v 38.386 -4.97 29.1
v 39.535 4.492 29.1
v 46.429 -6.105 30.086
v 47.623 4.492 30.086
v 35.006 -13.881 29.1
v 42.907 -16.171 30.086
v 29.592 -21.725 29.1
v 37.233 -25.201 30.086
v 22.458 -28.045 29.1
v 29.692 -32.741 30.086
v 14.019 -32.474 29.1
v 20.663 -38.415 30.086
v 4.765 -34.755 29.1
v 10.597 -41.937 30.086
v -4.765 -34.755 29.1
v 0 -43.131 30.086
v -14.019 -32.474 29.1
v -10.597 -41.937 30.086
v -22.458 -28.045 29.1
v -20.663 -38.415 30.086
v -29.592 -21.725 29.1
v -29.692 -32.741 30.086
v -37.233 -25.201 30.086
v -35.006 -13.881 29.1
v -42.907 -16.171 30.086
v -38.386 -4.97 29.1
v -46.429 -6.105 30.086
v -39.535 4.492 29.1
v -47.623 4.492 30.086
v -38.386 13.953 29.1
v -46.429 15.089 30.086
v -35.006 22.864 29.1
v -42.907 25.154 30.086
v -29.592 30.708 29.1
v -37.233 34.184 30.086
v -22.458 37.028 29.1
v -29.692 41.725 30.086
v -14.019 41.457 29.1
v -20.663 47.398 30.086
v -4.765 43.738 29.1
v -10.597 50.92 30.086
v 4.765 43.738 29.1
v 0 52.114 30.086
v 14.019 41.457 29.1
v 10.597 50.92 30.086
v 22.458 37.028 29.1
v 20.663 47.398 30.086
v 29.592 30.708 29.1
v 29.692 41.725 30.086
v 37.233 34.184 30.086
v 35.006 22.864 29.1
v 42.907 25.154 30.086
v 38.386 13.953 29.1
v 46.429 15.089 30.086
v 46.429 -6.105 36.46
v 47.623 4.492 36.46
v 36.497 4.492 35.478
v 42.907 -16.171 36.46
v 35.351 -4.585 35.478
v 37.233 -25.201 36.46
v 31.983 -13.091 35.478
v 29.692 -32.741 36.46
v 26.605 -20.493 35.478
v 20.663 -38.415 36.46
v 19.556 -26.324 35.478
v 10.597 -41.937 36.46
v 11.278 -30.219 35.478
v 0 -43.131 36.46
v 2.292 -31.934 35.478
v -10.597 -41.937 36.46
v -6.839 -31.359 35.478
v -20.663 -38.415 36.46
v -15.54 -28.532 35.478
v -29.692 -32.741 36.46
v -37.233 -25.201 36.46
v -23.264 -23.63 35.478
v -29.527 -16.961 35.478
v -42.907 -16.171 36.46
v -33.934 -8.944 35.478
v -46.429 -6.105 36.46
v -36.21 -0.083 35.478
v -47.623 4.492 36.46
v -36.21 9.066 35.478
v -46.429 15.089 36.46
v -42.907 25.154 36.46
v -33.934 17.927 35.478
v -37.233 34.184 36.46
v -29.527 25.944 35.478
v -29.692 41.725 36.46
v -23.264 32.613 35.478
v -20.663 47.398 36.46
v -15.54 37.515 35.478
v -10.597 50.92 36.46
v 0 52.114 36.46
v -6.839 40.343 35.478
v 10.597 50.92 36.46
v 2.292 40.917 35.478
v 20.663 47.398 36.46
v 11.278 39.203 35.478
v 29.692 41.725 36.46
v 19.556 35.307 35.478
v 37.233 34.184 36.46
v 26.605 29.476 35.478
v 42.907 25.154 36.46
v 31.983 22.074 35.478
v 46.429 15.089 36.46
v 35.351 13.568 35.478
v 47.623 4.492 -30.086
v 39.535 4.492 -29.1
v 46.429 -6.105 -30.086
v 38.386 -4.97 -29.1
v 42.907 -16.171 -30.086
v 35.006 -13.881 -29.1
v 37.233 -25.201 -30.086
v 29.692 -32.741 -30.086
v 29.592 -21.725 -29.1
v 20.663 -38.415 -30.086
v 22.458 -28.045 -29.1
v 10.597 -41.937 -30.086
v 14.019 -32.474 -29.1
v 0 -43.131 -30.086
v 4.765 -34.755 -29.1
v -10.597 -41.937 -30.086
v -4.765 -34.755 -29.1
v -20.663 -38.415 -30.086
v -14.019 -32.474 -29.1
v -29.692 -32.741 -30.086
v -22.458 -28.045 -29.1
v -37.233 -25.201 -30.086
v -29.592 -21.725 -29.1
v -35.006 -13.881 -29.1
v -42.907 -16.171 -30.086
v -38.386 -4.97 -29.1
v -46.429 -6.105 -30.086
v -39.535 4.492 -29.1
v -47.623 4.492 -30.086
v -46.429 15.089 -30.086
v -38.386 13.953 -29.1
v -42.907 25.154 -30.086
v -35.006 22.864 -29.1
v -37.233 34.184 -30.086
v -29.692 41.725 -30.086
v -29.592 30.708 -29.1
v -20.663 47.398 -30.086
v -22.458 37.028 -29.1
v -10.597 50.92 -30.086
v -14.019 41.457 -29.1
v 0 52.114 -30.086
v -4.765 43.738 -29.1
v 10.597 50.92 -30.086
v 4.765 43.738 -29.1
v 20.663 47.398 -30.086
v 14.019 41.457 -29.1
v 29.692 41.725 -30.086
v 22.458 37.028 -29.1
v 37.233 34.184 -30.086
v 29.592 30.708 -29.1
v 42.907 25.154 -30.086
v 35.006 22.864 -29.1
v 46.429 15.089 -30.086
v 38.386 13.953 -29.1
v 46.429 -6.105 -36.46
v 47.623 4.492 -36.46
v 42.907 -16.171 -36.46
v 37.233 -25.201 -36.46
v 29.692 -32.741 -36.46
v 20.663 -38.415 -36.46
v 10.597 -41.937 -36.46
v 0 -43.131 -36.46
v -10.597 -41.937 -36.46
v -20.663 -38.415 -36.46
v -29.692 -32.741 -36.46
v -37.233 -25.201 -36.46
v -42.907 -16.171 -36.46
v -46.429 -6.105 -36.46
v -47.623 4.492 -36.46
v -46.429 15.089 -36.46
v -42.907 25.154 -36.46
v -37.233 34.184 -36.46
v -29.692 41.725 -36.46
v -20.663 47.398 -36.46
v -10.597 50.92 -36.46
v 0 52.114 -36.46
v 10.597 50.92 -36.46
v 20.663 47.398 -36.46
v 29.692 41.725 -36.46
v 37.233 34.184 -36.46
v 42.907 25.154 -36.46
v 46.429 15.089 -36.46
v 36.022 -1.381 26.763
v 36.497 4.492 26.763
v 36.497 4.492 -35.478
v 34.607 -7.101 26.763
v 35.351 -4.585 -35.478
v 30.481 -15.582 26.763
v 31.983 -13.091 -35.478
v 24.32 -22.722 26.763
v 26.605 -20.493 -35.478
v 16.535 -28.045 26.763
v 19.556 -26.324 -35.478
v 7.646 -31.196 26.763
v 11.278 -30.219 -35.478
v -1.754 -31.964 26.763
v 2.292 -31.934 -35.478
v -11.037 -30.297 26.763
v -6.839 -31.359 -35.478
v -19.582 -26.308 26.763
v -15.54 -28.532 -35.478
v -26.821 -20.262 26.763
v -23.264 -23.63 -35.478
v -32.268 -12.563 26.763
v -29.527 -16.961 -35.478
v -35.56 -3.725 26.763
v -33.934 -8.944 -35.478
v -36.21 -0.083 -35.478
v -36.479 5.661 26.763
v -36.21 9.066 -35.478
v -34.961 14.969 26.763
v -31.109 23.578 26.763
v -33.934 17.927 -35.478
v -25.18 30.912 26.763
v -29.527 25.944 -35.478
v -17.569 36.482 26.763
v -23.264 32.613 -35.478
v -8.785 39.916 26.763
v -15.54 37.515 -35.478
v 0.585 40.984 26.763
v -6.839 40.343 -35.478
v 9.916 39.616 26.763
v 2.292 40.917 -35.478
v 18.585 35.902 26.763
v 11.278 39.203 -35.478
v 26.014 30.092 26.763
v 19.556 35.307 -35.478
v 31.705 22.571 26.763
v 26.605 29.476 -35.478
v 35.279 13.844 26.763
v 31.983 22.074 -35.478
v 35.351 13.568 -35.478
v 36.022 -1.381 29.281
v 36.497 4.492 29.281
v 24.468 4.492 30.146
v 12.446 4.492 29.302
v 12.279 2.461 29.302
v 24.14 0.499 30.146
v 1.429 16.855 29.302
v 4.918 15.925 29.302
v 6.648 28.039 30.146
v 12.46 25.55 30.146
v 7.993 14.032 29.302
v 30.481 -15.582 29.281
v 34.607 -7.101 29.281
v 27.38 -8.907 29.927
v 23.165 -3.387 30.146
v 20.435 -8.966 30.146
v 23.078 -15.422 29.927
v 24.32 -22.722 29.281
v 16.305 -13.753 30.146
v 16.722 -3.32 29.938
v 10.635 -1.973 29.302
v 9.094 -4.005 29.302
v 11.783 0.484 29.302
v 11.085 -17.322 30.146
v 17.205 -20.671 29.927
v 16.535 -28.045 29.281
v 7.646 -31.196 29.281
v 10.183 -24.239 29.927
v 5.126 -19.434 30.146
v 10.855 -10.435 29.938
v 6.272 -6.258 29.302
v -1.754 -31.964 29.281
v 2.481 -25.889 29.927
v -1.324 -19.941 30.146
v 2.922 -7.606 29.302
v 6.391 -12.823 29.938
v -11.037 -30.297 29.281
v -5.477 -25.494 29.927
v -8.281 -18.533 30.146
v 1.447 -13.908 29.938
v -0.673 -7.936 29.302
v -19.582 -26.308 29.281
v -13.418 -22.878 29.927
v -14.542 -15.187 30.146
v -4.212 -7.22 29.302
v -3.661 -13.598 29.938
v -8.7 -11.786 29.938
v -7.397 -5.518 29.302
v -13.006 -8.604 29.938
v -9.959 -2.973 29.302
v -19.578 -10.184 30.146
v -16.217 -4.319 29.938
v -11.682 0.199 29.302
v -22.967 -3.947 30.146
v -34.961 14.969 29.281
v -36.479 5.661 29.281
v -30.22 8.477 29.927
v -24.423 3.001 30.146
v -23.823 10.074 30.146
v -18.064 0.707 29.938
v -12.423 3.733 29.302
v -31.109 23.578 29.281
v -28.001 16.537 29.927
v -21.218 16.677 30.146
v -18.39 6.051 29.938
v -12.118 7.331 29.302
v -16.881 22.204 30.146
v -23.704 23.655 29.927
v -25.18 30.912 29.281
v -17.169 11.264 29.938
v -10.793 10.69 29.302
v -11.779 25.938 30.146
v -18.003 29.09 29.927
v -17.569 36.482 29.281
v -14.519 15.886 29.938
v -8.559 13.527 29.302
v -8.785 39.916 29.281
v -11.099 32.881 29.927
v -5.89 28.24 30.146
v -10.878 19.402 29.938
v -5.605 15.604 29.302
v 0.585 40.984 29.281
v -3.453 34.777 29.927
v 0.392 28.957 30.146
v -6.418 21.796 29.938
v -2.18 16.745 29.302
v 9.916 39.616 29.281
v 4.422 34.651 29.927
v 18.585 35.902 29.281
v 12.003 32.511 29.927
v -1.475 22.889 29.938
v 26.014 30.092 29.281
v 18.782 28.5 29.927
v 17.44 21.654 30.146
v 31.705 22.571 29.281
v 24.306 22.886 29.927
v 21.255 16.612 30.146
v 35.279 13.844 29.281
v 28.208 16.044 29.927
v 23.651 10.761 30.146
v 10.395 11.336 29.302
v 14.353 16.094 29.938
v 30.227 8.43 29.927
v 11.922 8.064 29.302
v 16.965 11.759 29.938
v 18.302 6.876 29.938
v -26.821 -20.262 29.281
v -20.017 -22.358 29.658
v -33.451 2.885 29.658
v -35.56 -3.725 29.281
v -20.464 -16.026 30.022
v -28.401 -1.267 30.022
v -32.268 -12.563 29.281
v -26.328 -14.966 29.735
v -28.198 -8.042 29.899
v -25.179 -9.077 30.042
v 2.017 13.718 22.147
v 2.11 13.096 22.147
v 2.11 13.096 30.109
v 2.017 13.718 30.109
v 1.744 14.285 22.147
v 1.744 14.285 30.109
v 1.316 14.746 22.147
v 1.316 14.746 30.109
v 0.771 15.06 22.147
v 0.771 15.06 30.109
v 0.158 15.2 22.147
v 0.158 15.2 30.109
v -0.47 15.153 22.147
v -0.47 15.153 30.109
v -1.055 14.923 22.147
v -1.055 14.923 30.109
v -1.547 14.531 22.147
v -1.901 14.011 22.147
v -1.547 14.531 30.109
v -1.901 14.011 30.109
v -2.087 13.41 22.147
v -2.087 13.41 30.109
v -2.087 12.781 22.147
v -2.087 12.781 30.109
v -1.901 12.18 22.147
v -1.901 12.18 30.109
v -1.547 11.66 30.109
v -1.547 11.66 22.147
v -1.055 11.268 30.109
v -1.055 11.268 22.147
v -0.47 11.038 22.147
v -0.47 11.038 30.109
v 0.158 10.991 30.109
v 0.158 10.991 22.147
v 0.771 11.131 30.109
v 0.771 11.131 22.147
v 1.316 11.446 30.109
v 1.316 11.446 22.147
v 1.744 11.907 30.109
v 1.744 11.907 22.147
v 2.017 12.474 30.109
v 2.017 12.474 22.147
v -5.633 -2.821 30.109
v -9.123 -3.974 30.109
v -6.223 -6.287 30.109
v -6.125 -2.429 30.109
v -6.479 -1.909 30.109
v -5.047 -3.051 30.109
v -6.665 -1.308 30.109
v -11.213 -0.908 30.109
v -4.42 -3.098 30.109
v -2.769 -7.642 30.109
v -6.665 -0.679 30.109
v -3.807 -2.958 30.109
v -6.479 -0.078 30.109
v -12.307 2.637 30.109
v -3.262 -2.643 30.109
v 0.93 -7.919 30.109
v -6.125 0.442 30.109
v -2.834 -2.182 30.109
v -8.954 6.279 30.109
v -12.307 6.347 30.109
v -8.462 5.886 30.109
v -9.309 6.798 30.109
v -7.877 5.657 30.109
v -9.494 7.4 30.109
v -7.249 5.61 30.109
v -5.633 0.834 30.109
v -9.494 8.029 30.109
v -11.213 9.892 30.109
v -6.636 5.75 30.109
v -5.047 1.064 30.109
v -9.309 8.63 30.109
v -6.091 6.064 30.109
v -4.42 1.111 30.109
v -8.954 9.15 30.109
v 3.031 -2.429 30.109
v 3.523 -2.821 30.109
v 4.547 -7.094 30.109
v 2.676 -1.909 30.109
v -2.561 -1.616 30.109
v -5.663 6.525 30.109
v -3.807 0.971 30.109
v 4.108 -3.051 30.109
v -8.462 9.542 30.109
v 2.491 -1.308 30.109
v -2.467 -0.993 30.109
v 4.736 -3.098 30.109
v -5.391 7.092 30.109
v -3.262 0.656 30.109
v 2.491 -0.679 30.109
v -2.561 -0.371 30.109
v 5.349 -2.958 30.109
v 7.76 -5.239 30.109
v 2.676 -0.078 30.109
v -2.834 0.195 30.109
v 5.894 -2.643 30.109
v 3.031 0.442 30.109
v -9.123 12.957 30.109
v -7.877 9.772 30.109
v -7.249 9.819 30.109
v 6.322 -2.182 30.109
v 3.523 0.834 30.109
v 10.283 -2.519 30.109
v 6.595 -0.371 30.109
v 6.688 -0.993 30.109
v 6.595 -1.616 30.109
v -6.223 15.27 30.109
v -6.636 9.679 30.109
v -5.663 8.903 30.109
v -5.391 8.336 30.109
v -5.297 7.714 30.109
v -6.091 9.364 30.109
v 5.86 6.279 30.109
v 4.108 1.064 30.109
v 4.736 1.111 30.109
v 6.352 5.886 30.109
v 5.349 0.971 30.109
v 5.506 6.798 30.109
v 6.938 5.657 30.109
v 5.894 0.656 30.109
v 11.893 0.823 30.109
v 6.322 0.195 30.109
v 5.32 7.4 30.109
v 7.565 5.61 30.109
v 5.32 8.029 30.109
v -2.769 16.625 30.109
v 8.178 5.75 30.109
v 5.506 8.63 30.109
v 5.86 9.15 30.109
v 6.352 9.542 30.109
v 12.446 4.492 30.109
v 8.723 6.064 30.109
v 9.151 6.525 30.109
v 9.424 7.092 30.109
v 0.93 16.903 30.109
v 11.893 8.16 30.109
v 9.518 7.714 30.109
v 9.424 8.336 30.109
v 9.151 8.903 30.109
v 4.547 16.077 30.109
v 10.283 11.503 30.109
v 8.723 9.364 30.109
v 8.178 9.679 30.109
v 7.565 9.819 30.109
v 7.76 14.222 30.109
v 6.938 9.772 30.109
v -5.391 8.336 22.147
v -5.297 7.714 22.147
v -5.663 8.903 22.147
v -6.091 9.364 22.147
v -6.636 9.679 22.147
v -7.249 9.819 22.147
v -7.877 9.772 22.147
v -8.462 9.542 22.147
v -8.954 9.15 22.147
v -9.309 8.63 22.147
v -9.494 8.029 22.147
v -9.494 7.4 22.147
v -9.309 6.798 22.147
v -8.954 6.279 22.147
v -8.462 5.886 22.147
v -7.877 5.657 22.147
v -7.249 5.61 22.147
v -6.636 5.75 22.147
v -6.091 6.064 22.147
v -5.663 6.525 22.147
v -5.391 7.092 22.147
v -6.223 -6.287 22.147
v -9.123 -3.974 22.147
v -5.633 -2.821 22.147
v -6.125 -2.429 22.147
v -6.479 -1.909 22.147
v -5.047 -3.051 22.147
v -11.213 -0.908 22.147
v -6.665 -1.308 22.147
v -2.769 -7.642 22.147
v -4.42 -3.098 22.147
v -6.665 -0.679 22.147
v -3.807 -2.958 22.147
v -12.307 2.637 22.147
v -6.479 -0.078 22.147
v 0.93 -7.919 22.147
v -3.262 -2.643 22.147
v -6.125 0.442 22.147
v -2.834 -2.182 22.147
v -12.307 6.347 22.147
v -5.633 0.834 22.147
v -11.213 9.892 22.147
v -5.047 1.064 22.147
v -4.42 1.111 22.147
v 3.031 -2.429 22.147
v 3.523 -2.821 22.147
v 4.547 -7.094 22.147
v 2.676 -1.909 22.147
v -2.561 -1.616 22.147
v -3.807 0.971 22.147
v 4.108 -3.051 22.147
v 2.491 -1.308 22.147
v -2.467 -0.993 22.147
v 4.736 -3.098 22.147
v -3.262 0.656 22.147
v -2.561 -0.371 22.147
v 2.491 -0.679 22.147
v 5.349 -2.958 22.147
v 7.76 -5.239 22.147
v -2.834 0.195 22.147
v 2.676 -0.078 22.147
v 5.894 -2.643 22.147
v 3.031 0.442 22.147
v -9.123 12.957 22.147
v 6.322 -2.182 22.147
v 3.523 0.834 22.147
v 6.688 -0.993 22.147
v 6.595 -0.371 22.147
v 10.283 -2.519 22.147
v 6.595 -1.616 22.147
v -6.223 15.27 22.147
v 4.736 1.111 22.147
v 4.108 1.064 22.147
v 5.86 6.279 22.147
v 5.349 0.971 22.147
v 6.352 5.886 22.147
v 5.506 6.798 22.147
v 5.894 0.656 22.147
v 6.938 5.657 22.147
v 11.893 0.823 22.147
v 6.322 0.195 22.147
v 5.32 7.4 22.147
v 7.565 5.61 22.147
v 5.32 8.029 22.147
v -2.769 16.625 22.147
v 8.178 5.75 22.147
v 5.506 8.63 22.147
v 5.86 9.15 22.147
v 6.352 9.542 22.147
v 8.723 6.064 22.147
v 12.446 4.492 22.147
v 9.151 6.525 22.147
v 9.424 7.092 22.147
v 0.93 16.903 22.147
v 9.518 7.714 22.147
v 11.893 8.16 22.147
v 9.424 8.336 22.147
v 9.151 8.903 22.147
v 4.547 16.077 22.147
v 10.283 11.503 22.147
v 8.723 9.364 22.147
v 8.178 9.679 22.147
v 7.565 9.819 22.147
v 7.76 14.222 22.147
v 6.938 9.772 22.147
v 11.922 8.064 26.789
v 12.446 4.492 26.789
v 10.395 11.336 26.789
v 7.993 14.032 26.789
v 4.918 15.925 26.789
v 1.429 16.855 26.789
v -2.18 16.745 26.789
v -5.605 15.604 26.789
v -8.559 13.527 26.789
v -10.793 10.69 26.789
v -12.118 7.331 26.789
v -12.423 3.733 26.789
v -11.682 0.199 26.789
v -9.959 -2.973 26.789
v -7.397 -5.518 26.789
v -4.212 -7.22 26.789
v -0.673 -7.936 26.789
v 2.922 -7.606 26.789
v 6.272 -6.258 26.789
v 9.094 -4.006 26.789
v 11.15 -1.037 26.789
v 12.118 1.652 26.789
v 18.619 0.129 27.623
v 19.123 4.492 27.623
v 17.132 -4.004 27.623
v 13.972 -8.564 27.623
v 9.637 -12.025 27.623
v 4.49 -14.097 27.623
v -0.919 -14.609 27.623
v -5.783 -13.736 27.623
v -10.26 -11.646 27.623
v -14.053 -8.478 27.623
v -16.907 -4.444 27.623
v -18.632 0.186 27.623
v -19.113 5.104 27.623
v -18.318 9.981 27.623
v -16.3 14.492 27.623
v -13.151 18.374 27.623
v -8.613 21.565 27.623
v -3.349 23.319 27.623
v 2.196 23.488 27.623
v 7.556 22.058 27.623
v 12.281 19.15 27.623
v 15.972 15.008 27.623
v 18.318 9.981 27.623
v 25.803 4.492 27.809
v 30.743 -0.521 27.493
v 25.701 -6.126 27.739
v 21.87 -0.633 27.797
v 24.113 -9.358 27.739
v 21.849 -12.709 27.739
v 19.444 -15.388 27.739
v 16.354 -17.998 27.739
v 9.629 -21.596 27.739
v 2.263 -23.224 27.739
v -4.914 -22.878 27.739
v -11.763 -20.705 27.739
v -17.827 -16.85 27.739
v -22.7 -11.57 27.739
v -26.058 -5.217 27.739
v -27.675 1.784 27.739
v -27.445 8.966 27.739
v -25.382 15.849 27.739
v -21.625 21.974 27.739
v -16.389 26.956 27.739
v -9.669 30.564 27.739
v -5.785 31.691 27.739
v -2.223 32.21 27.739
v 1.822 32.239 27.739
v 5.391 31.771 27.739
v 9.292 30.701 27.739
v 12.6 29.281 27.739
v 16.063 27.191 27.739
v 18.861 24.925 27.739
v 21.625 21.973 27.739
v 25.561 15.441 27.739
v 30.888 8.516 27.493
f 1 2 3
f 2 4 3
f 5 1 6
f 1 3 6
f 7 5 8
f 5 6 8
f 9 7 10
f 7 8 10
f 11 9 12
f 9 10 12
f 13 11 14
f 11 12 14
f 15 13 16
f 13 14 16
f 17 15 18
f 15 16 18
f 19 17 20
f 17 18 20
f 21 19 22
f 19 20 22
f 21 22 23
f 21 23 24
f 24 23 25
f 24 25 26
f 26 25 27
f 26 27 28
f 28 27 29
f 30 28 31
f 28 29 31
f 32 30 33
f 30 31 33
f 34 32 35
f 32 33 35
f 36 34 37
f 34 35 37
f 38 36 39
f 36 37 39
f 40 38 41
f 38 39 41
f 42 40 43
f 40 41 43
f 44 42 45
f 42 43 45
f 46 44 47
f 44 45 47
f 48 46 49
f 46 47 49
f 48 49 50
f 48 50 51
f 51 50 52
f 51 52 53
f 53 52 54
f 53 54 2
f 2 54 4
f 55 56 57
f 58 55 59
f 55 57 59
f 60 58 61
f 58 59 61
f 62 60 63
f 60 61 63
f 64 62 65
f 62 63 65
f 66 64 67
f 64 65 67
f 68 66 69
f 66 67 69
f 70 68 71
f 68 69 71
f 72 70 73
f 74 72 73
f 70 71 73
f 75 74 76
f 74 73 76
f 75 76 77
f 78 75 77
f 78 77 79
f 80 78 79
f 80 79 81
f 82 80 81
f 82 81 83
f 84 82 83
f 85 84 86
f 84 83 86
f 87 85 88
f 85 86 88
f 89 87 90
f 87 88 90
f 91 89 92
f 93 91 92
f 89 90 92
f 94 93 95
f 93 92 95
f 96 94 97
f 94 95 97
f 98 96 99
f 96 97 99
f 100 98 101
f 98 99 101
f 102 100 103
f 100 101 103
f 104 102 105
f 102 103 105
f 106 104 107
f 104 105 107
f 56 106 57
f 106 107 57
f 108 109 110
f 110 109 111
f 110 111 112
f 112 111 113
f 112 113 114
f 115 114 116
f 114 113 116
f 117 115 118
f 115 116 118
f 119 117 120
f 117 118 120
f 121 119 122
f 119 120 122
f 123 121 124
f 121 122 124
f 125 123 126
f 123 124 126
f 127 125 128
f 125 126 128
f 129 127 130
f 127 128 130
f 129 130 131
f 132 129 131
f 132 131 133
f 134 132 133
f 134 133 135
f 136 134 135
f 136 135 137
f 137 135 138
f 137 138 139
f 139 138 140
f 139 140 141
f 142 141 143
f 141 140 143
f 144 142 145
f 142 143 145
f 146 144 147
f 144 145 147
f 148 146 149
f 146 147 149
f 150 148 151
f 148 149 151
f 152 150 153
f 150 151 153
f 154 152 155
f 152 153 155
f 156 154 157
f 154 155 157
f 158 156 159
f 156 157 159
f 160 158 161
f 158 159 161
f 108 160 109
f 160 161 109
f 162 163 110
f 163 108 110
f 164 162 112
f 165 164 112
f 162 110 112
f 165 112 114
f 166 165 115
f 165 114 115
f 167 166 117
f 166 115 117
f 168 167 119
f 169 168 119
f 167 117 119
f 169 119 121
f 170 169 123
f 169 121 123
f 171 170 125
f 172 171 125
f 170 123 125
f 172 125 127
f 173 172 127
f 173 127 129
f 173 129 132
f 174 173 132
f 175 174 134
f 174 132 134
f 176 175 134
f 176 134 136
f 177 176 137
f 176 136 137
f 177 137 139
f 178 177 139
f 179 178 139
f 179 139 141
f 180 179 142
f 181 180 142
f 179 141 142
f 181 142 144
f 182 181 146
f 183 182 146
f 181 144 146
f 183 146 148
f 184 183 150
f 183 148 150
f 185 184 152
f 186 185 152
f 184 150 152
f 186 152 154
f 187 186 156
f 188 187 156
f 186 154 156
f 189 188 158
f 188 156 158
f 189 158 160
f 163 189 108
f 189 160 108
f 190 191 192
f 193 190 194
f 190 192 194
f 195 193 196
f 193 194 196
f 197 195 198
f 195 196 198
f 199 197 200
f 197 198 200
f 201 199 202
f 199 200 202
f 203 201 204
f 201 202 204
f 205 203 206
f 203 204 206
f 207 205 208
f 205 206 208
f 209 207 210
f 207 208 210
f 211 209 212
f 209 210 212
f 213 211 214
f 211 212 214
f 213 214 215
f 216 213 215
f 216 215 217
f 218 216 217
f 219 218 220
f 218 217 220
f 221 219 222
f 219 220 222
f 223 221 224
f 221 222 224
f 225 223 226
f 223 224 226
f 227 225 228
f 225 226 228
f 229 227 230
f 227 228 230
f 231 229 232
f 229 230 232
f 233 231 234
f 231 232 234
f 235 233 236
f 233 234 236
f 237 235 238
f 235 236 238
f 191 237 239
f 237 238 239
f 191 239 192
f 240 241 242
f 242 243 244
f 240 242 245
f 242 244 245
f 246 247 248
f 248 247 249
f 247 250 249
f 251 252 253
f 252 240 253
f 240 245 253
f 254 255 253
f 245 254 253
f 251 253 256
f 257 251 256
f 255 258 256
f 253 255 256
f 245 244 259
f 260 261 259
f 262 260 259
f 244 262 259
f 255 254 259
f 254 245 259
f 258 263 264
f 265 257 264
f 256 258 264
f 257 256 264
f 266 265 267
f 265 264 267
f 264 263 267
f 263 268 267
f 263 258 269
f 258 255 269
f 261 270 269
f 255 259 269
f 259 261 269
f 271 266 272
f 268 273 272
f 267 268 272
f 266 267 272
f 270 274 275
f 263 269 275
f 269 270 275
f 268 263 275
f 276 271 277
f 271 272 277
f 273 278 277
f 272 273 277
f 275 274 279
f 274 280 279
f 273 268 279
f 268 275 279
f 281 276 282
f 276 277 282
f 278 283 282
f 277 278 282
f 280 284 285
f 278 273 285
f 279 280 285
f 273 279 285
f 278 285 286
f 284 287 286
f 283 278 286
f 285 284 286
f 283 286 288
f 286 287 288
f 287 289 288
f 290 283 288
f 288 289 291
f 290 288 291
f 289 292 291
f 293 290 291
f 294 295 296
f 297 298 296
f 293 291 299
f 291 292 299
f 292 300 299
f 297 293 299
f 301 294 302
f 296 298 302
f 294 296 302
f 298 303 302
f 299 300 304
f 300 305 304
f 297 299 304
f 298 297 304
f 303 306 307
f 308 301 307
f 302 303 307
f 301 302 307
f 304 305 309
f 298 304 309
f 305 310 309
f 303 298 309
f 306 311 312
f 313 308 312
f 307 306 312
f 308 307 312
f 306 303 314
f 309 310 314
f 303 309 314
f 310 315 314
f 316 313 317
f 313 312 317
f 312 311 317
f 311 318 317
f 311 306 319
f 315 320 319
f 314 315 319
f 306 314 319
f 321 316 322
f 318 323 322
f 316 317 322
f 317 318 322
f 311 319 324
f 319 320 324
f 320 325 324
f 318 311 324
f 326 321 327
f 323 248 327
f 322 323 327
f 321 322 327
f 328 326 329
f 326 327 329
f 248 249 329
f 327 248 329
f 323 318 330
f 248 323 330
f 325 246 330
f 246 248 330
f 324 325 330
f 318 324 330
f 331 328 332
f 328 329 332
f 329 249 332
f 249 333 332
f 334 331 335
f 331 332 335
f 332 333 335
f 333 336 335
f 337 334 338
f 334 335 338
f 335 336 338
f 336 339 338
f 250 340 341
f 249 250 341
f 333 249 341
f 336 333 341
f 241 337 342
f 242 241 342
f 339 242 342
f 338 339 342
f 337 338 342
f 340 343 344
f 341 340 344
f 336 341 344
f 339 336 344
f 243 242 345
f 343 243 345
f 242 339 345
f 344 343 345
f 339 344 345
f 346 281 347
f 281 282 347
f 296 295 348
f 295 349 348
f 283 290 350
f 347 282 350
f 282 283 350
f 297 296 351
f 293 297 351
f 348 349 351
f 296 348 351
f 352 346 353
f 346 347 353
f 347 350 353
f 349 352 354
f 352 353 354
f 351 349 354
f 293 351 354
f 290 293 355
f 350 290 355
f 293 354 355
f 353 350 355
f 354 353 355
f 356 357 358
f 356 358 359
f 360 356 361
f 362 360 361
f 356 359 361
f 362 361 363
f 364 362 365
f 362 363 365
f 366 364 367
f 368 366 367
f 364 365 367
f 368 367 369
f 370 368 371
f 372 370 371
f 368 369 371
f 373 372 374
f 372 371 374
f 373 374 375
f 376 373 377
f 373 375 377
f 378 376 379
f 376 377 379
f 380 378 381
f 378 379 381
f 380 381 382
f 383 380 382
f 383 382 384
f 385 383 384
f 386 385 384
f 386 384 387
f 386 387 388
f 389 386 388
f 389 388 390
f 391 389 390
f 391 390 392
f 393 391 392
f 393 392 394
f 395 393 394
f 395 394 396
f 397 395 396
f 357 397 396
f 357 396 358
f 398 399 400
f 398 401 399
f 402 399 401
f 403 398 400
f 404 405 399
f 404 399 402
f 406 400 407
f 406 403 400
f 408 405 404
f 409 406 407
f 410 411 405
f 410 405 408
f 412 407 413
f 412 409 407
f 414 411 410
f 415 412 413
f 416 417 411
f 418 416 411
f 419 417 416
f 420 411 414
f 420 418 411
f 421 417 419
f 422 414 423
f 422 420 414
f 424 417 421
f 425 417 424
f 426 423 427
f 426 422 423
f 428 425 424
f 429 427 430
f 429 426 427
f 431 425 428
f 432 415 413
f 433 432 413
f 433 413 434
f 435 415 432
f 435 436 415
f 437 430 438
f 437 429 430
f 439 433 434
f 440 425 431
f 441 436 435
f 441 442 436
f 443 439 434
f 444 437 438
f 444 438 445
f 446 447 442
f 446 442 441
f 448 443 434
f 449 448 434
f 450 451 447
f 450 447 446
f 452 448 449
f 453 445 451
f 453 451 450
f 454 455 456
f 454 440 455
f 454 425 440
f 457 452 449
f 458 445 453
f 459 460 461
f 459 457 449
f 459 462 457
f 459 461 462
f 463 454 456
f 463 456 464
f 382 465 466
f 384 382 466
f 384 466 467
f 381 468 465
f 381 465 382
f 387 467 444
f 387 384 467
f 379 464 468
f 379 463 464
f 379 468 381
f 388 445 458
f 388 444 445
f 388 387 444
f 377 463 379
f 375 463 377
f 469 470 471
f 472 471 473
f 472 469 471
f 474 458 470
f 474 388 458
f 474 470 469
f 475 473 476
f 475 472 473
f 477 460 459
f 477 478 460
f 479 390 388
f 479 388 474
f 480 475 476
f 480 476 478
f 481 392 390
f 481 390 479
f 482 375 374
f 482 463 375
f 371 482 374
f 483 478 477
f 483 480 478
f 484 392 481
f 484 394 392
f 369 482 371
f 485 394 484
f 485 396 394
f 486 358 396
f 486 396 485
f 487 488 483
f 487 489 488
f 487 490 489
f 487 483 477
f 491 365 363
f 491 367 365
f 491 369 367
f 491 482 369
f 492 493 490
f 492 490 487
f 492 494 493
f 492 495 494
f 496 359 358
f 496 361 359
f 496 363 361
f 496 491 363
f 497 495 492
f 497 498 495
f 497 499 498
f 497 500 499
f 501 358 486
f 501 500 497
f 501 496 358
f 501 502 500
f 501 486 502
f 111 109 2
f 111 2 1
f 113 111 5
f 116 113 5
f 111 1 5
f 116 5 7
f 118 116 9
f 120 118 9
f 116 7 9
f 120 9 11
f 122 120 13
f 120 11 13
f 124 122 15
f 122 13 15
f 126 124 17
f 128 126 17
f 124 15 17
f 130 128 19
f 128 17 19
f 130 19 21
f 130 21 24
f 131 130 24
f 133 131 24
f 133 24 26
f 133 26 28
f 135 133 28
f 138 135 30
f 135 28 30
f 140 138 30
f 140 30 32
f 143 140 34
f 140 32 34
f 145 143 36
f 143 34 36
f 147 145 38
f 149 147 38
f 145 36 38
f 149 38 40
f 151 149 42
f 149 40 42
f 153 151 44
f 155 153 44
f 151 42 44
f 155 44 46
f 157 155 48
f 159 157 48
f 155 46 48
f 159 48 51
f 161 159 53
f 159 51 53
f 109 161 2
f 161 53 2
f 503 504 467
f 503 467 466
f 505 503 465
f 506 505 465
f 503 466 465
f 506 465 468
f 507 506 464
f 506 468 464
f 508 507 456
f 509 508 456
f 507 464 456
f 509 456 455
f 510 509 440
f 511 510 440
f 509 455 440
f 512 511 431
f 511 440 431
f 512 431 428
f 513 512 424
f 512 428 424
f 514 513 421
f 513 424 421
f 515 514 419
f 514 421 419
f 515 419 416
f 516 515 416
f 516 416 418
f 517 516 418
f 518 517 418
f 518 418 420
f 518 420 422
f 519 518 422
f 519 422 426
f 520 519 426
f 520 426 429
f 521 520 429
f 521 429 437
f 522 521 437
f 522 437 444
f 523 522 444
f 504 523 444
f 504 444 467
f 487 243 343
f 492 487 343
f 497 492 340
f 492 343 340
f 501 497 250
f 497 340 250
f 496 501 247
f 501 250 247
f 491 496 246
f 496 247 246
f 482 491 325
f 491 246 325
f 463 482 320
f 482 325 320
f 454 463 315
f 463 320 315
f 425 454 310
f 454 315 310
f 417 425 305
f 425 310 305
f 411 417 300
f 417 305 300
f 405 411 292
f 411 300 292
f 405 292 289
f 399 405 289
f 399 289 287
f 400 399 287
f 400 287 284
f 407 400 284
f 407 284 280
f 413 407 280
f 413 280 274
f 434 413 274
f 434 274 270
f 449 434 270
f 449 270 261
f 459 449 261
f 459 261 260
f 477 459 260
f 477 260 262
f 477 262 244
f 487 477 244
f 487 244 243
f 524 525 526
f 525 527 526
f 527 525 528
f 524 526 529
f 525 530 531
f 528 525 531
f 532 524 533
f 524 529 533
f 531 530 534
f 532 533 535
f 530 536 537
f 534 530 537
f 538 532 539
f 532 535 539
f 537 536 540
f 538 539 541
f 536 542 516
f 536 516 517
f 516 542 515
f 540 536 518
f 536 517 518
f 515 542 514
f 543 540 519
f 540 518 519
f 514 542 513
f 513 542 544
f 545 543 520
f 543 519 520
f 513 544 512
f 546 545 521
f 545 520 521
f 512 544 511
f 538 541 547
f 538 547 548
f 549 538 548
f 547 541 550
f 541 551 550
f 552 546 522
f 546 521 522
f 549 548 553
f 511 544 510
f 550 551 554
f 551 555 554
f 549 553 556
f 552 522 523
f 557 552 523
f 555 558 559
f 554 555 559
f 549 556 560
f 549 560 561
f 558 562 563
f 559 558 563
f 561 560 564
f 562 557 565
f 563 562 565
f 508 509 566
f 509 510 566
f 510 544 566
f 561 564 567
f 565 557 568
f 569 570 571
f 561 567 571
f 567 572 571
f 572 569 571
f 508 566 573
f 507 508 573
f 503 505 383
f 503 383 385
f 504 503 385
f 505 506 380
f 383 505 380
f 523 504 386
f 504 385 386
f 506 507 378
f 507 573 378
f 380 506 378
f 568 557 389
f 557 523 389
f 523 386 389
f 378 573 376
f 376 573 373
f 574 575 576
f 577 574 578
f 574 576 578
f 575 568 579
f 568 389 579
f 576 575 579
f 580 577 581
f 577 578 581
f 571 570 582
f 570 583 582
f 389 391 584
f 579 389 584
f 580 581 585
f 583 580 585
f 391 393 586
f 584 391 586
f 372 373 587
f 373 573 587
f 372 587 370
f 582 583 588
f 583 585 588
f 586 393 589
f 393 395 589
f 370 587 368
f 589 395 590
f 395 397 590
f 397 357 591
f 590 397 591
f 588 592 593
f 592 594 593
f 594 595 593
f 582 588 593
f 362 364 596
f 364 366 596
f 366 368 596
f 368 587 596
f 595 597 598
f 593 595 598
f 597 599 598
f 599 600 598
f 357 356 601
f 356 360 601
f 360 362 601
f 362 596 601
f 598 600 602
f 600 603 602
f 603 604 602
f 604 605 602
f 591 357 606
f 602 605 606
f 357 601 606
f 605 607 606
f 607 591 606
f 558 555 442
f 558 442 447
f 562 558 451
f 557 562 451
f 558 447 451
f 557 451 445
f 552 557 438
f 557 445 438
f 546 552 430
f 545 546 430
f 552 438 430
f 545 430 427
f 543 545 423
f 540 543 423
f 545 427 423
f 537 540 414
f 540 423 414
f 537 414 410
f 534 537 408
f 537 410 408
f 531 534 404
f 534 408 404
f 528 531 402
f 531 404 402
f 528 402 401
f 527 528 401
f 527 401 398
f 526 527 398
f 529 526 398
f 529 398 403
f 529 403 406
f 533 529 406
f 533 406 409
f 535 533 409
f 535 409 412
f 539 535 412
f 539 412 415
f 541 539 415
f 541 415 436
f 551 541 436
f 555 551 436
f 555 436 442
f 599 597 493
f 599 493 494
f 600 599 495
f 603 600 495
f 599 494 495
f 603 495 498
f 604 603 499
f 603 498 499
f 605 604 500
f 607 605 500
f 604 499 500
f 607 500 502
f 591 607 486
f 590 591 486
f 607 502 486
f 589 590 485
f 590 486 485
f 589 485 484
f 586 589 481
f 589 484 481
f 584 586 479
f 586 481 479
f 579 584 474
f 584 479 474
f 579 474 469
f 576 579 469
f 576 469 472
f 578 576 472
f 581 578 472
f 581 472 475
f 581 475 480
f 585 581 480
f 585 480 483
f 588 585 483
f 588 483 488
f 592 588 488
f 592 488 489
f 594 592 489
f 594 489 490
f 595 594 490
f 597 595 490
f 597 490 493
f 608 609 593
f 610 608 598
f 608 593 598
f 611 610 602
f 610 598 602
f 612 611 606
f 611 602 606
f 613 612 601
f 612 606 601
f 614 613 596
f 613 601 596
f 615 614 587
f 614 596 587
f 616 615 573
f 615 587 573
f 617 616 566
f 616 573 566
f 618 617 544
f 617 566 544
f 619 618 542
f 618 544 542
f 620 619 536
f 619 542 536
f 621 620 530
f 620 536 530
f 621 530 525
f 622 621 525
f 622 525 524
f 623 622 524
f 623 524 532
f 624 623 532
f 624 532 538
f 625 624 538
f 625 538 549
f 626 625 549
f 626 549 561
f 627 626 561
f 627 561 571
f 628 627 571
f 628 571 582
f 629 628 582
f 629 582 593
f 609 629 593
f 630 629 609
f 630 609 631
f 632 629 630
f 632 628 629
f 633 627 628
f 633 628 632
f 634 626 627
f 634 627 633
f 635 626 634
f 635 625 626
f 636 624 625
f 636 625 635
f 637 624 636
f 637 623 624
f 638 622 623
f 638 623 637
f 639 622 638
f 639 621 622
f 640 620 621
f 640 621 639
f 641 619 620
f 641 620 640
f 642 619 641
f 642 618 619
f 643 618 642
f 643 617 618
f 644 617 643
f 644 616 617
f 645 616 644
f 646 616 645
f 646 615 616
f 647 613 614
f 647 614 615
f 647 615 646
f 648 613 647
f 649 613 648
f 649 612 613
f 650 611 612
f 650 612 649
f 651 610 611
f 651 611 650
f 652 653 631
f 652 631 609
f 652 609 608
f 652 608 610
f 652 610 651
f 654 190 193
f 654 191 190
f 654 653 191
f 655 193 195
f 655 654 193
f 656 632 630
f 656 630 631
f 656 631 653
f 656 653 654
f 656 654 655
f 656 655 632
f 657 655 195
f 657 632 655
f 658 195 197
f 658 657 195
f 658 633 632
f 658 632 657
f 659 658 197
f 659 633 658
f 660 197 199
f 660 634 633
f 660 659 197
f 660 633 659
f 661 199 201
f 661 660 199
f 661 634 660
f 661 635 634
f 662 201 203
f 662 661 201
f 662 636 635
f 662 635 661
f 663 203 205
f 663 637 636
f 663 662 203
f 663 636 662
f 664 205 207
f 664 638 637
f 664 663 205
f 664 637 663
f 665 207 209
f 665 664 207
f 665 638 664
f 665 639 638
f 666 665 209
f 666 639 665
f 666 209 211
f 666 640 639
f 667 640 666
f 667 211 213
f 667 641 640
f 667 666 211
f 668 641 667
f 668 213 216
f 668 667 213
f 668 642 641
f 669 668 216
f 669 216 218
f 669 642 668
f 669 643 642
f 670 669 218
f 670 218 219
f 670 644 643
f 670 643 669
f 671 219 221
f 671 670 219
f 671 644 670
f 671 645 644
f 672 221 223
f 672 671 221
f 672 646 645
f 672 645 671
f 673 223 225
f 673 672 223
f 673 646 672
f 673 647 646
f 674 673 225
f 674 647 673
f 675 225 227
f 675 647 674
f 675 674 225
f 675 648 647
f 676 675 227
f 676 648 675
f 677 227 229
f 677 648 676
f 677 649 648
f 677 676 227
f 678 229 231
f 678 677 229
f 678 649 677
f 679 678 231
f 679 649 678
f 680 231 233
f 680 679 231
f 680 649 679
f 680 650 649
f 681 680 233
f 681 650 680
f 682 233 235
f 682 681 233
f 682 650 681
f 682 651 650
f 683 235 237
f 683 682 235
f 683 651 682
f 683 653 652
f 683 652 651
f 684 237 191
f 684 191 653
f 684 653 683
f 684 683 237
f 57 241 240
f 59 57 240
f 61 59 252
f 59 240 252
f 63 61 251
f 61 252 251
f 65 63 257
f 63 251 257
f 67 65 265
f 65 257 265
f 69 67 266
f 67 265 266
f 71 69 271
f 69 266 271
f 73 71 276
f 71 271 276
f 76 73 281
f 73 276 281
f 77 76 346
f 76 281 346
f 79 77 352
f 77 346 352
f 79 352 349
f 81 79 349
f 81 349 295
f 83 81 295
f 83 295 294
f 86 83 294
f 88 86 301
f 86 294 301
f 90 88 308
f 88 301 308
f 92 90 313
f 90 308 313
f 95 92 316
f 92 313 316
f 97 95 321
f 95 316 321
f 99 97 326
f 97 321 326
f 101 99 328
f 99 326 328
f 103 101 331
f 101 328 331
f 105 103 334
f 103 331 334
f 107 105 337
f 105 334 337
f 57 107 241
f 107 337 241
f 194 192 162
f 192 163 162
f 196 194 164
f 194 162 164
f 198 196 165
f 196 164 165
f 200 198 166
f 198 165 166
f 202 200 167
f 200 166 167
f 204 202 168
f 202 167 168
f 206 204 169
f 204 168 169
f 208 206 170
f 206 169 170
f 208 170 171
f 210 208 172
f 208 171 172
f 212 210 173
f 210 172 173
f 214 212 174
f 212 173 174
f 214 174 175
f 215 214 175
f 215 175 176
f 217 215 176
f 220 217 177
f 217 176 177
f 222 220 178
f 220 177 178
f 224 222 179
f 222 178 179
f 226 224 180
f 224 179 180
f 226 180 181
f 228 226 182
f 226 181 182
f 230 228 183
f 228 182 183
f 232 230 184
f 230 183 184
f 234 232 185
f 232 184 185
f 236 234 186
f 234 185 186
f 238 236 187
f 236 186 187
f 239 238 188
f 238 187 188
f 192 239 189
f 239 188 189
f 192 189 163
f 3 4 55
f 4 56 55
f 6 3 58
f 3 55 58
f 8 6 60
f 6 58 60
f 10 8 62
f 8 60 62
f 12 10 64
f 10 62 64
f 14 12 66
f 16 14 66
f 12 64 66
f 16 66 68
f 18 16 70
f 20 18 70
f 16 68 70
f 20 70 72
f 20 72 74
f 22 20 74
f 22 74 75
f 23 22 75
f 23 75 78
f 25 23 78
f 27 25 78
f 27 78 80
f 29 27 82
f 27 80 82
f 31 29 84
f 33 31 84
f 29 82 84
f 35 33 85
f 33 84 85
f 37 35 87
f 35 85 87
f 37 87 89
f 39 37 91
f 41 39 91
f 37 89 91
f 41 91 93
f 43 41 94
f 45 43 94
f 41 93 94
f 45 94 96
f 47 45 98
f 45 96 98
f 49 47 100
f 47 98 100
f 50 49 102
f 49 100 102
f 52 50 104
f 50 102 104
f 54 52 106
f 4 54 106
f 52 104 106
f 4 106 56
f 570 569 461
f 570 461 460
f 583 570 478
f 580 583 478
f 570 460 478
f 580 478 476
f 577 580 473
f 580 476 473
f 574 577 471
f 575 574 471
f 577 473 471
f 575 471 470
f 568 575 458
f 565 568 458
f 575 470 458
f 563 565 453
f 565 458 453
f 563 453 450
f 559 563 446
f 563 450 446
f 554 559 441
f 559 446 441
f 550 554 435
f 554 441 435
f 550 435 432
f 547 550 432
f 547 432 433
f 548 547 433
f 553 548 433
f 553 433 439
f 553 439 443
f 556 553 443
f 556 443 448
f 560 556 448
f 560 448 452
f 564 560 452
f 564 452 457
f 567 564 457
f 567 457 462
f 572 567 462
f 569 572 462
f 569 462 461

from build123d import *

# Parameters (mm, degrees)
SKETCH8_R           = 12.445803737
BOSS_EXTRUDE2_DEPTH = 7.961436264
SKETCH10_R          = 2.110408374
CUT_EXTRUDE1_DEPTH  = 137.414


with BuildPart() as part:
    # Sketch3 → Revolve2 (revolve)
    with BuildSketch(Plane(origin=(0, 0, 0), x_dir=(0, 0, -1), z_dir=(1, 0, 0)), mode=Mode.PRIVATE) as revolve2_sk:
        Polygon((29.100336298, 44.026196045), (-29.100336298, 44.026196045), (-30.085520968, 52.11445688), (-36.460084033, 52.11445688), (-35.478243613, 40.988977361), (35.478243613, 40.988977361), (36.460084033, 52.11445688), (30.085520968, 52.11445688), align=None)
    revolve(revolve2_sk.sketch.rotate(Axis((0, 4.491617138, 34.868994977), (0, 0, -1)), 90), axis=Axis((0, 4.491617138, 34.868994977), (0, 0, -1)))



with BuildPart() as body_2:
    # Sketch8 → Boss-Extrude2 (new body)
    with BuildSketch(Plane.XY.offset(22.147154131)):
        with Locations((0, 4.491617138)):
            Circle(SKETCH8_R)
    extrude(amount=BOSS_EXTRUDE2_DEPTH)

    # Sketch10 → Cut-Extrude1 (cut)
    with BuildSketch(Plane.XY.offset(40.64)):
        with Locations((0, 13.095758201)):
            Circle(SKETCH10_R)
        with Locations((7.407159638, 7.714141713)):
            Circle(SKETCH10_R)
        with Locations((4.577876416, -0.99349668)):
            Circle(SKETCH10_R)
        with Locations((-4.577876416, -0.99349668)):
            Circle(SKETCH10_R)
        with Locations((-7.407159638, 7.714141713)):
            Circle(SKETCH10_R)
    extrude(amount=-CUT_EXTRUDE1_DEPTH, mode=Mode.SUBTRACT)


with BuildPart() as part_1:
    add(part.part)

    add(body_2.part)  # Revolve4 merges body 2
    # Sketch12 → Revolve4 (revolve)
    with BuildSketch(Plane(origin=(0, 0, 0), x_dir=(0, 0, -1), z_dir=(1, 0, 0)), mode=Mode.PRIVATE) as revolve4_sk:
        with BuildLine():
            Line((-29.100336298, 42.19314735), (-26.54142097, 42.19314735))
            add(Edge.make_bspline(
                [(-26.54142097, 42.19314735), (-29.106417972, 28.876495724), (-26.54142097, 15.583923694)],
                knots=[0, 0, 0, 1, 1, 1], degree=2))
            Line((-26.54142097, 15.583923694), (-29.100336298, 15.583923694))
            add(Edge.make_bspline(
                [(-29.100336298, 42.19314735), (-31.192110403, 28.880503774), (-29.100336298, 15.583923694)],
                knots=[0, 0, 0, 1, 1, 1], degree=2))
        make_face()
    revolve(revolve4_sk.sketch.rotate(Axis((0, 4.491617138, 34.868994977), (0, 0, -1)), 90), axis=Axis((0, 4.491617138, 34.868994977), (0, 0, -1)))


solid = part_1.part
